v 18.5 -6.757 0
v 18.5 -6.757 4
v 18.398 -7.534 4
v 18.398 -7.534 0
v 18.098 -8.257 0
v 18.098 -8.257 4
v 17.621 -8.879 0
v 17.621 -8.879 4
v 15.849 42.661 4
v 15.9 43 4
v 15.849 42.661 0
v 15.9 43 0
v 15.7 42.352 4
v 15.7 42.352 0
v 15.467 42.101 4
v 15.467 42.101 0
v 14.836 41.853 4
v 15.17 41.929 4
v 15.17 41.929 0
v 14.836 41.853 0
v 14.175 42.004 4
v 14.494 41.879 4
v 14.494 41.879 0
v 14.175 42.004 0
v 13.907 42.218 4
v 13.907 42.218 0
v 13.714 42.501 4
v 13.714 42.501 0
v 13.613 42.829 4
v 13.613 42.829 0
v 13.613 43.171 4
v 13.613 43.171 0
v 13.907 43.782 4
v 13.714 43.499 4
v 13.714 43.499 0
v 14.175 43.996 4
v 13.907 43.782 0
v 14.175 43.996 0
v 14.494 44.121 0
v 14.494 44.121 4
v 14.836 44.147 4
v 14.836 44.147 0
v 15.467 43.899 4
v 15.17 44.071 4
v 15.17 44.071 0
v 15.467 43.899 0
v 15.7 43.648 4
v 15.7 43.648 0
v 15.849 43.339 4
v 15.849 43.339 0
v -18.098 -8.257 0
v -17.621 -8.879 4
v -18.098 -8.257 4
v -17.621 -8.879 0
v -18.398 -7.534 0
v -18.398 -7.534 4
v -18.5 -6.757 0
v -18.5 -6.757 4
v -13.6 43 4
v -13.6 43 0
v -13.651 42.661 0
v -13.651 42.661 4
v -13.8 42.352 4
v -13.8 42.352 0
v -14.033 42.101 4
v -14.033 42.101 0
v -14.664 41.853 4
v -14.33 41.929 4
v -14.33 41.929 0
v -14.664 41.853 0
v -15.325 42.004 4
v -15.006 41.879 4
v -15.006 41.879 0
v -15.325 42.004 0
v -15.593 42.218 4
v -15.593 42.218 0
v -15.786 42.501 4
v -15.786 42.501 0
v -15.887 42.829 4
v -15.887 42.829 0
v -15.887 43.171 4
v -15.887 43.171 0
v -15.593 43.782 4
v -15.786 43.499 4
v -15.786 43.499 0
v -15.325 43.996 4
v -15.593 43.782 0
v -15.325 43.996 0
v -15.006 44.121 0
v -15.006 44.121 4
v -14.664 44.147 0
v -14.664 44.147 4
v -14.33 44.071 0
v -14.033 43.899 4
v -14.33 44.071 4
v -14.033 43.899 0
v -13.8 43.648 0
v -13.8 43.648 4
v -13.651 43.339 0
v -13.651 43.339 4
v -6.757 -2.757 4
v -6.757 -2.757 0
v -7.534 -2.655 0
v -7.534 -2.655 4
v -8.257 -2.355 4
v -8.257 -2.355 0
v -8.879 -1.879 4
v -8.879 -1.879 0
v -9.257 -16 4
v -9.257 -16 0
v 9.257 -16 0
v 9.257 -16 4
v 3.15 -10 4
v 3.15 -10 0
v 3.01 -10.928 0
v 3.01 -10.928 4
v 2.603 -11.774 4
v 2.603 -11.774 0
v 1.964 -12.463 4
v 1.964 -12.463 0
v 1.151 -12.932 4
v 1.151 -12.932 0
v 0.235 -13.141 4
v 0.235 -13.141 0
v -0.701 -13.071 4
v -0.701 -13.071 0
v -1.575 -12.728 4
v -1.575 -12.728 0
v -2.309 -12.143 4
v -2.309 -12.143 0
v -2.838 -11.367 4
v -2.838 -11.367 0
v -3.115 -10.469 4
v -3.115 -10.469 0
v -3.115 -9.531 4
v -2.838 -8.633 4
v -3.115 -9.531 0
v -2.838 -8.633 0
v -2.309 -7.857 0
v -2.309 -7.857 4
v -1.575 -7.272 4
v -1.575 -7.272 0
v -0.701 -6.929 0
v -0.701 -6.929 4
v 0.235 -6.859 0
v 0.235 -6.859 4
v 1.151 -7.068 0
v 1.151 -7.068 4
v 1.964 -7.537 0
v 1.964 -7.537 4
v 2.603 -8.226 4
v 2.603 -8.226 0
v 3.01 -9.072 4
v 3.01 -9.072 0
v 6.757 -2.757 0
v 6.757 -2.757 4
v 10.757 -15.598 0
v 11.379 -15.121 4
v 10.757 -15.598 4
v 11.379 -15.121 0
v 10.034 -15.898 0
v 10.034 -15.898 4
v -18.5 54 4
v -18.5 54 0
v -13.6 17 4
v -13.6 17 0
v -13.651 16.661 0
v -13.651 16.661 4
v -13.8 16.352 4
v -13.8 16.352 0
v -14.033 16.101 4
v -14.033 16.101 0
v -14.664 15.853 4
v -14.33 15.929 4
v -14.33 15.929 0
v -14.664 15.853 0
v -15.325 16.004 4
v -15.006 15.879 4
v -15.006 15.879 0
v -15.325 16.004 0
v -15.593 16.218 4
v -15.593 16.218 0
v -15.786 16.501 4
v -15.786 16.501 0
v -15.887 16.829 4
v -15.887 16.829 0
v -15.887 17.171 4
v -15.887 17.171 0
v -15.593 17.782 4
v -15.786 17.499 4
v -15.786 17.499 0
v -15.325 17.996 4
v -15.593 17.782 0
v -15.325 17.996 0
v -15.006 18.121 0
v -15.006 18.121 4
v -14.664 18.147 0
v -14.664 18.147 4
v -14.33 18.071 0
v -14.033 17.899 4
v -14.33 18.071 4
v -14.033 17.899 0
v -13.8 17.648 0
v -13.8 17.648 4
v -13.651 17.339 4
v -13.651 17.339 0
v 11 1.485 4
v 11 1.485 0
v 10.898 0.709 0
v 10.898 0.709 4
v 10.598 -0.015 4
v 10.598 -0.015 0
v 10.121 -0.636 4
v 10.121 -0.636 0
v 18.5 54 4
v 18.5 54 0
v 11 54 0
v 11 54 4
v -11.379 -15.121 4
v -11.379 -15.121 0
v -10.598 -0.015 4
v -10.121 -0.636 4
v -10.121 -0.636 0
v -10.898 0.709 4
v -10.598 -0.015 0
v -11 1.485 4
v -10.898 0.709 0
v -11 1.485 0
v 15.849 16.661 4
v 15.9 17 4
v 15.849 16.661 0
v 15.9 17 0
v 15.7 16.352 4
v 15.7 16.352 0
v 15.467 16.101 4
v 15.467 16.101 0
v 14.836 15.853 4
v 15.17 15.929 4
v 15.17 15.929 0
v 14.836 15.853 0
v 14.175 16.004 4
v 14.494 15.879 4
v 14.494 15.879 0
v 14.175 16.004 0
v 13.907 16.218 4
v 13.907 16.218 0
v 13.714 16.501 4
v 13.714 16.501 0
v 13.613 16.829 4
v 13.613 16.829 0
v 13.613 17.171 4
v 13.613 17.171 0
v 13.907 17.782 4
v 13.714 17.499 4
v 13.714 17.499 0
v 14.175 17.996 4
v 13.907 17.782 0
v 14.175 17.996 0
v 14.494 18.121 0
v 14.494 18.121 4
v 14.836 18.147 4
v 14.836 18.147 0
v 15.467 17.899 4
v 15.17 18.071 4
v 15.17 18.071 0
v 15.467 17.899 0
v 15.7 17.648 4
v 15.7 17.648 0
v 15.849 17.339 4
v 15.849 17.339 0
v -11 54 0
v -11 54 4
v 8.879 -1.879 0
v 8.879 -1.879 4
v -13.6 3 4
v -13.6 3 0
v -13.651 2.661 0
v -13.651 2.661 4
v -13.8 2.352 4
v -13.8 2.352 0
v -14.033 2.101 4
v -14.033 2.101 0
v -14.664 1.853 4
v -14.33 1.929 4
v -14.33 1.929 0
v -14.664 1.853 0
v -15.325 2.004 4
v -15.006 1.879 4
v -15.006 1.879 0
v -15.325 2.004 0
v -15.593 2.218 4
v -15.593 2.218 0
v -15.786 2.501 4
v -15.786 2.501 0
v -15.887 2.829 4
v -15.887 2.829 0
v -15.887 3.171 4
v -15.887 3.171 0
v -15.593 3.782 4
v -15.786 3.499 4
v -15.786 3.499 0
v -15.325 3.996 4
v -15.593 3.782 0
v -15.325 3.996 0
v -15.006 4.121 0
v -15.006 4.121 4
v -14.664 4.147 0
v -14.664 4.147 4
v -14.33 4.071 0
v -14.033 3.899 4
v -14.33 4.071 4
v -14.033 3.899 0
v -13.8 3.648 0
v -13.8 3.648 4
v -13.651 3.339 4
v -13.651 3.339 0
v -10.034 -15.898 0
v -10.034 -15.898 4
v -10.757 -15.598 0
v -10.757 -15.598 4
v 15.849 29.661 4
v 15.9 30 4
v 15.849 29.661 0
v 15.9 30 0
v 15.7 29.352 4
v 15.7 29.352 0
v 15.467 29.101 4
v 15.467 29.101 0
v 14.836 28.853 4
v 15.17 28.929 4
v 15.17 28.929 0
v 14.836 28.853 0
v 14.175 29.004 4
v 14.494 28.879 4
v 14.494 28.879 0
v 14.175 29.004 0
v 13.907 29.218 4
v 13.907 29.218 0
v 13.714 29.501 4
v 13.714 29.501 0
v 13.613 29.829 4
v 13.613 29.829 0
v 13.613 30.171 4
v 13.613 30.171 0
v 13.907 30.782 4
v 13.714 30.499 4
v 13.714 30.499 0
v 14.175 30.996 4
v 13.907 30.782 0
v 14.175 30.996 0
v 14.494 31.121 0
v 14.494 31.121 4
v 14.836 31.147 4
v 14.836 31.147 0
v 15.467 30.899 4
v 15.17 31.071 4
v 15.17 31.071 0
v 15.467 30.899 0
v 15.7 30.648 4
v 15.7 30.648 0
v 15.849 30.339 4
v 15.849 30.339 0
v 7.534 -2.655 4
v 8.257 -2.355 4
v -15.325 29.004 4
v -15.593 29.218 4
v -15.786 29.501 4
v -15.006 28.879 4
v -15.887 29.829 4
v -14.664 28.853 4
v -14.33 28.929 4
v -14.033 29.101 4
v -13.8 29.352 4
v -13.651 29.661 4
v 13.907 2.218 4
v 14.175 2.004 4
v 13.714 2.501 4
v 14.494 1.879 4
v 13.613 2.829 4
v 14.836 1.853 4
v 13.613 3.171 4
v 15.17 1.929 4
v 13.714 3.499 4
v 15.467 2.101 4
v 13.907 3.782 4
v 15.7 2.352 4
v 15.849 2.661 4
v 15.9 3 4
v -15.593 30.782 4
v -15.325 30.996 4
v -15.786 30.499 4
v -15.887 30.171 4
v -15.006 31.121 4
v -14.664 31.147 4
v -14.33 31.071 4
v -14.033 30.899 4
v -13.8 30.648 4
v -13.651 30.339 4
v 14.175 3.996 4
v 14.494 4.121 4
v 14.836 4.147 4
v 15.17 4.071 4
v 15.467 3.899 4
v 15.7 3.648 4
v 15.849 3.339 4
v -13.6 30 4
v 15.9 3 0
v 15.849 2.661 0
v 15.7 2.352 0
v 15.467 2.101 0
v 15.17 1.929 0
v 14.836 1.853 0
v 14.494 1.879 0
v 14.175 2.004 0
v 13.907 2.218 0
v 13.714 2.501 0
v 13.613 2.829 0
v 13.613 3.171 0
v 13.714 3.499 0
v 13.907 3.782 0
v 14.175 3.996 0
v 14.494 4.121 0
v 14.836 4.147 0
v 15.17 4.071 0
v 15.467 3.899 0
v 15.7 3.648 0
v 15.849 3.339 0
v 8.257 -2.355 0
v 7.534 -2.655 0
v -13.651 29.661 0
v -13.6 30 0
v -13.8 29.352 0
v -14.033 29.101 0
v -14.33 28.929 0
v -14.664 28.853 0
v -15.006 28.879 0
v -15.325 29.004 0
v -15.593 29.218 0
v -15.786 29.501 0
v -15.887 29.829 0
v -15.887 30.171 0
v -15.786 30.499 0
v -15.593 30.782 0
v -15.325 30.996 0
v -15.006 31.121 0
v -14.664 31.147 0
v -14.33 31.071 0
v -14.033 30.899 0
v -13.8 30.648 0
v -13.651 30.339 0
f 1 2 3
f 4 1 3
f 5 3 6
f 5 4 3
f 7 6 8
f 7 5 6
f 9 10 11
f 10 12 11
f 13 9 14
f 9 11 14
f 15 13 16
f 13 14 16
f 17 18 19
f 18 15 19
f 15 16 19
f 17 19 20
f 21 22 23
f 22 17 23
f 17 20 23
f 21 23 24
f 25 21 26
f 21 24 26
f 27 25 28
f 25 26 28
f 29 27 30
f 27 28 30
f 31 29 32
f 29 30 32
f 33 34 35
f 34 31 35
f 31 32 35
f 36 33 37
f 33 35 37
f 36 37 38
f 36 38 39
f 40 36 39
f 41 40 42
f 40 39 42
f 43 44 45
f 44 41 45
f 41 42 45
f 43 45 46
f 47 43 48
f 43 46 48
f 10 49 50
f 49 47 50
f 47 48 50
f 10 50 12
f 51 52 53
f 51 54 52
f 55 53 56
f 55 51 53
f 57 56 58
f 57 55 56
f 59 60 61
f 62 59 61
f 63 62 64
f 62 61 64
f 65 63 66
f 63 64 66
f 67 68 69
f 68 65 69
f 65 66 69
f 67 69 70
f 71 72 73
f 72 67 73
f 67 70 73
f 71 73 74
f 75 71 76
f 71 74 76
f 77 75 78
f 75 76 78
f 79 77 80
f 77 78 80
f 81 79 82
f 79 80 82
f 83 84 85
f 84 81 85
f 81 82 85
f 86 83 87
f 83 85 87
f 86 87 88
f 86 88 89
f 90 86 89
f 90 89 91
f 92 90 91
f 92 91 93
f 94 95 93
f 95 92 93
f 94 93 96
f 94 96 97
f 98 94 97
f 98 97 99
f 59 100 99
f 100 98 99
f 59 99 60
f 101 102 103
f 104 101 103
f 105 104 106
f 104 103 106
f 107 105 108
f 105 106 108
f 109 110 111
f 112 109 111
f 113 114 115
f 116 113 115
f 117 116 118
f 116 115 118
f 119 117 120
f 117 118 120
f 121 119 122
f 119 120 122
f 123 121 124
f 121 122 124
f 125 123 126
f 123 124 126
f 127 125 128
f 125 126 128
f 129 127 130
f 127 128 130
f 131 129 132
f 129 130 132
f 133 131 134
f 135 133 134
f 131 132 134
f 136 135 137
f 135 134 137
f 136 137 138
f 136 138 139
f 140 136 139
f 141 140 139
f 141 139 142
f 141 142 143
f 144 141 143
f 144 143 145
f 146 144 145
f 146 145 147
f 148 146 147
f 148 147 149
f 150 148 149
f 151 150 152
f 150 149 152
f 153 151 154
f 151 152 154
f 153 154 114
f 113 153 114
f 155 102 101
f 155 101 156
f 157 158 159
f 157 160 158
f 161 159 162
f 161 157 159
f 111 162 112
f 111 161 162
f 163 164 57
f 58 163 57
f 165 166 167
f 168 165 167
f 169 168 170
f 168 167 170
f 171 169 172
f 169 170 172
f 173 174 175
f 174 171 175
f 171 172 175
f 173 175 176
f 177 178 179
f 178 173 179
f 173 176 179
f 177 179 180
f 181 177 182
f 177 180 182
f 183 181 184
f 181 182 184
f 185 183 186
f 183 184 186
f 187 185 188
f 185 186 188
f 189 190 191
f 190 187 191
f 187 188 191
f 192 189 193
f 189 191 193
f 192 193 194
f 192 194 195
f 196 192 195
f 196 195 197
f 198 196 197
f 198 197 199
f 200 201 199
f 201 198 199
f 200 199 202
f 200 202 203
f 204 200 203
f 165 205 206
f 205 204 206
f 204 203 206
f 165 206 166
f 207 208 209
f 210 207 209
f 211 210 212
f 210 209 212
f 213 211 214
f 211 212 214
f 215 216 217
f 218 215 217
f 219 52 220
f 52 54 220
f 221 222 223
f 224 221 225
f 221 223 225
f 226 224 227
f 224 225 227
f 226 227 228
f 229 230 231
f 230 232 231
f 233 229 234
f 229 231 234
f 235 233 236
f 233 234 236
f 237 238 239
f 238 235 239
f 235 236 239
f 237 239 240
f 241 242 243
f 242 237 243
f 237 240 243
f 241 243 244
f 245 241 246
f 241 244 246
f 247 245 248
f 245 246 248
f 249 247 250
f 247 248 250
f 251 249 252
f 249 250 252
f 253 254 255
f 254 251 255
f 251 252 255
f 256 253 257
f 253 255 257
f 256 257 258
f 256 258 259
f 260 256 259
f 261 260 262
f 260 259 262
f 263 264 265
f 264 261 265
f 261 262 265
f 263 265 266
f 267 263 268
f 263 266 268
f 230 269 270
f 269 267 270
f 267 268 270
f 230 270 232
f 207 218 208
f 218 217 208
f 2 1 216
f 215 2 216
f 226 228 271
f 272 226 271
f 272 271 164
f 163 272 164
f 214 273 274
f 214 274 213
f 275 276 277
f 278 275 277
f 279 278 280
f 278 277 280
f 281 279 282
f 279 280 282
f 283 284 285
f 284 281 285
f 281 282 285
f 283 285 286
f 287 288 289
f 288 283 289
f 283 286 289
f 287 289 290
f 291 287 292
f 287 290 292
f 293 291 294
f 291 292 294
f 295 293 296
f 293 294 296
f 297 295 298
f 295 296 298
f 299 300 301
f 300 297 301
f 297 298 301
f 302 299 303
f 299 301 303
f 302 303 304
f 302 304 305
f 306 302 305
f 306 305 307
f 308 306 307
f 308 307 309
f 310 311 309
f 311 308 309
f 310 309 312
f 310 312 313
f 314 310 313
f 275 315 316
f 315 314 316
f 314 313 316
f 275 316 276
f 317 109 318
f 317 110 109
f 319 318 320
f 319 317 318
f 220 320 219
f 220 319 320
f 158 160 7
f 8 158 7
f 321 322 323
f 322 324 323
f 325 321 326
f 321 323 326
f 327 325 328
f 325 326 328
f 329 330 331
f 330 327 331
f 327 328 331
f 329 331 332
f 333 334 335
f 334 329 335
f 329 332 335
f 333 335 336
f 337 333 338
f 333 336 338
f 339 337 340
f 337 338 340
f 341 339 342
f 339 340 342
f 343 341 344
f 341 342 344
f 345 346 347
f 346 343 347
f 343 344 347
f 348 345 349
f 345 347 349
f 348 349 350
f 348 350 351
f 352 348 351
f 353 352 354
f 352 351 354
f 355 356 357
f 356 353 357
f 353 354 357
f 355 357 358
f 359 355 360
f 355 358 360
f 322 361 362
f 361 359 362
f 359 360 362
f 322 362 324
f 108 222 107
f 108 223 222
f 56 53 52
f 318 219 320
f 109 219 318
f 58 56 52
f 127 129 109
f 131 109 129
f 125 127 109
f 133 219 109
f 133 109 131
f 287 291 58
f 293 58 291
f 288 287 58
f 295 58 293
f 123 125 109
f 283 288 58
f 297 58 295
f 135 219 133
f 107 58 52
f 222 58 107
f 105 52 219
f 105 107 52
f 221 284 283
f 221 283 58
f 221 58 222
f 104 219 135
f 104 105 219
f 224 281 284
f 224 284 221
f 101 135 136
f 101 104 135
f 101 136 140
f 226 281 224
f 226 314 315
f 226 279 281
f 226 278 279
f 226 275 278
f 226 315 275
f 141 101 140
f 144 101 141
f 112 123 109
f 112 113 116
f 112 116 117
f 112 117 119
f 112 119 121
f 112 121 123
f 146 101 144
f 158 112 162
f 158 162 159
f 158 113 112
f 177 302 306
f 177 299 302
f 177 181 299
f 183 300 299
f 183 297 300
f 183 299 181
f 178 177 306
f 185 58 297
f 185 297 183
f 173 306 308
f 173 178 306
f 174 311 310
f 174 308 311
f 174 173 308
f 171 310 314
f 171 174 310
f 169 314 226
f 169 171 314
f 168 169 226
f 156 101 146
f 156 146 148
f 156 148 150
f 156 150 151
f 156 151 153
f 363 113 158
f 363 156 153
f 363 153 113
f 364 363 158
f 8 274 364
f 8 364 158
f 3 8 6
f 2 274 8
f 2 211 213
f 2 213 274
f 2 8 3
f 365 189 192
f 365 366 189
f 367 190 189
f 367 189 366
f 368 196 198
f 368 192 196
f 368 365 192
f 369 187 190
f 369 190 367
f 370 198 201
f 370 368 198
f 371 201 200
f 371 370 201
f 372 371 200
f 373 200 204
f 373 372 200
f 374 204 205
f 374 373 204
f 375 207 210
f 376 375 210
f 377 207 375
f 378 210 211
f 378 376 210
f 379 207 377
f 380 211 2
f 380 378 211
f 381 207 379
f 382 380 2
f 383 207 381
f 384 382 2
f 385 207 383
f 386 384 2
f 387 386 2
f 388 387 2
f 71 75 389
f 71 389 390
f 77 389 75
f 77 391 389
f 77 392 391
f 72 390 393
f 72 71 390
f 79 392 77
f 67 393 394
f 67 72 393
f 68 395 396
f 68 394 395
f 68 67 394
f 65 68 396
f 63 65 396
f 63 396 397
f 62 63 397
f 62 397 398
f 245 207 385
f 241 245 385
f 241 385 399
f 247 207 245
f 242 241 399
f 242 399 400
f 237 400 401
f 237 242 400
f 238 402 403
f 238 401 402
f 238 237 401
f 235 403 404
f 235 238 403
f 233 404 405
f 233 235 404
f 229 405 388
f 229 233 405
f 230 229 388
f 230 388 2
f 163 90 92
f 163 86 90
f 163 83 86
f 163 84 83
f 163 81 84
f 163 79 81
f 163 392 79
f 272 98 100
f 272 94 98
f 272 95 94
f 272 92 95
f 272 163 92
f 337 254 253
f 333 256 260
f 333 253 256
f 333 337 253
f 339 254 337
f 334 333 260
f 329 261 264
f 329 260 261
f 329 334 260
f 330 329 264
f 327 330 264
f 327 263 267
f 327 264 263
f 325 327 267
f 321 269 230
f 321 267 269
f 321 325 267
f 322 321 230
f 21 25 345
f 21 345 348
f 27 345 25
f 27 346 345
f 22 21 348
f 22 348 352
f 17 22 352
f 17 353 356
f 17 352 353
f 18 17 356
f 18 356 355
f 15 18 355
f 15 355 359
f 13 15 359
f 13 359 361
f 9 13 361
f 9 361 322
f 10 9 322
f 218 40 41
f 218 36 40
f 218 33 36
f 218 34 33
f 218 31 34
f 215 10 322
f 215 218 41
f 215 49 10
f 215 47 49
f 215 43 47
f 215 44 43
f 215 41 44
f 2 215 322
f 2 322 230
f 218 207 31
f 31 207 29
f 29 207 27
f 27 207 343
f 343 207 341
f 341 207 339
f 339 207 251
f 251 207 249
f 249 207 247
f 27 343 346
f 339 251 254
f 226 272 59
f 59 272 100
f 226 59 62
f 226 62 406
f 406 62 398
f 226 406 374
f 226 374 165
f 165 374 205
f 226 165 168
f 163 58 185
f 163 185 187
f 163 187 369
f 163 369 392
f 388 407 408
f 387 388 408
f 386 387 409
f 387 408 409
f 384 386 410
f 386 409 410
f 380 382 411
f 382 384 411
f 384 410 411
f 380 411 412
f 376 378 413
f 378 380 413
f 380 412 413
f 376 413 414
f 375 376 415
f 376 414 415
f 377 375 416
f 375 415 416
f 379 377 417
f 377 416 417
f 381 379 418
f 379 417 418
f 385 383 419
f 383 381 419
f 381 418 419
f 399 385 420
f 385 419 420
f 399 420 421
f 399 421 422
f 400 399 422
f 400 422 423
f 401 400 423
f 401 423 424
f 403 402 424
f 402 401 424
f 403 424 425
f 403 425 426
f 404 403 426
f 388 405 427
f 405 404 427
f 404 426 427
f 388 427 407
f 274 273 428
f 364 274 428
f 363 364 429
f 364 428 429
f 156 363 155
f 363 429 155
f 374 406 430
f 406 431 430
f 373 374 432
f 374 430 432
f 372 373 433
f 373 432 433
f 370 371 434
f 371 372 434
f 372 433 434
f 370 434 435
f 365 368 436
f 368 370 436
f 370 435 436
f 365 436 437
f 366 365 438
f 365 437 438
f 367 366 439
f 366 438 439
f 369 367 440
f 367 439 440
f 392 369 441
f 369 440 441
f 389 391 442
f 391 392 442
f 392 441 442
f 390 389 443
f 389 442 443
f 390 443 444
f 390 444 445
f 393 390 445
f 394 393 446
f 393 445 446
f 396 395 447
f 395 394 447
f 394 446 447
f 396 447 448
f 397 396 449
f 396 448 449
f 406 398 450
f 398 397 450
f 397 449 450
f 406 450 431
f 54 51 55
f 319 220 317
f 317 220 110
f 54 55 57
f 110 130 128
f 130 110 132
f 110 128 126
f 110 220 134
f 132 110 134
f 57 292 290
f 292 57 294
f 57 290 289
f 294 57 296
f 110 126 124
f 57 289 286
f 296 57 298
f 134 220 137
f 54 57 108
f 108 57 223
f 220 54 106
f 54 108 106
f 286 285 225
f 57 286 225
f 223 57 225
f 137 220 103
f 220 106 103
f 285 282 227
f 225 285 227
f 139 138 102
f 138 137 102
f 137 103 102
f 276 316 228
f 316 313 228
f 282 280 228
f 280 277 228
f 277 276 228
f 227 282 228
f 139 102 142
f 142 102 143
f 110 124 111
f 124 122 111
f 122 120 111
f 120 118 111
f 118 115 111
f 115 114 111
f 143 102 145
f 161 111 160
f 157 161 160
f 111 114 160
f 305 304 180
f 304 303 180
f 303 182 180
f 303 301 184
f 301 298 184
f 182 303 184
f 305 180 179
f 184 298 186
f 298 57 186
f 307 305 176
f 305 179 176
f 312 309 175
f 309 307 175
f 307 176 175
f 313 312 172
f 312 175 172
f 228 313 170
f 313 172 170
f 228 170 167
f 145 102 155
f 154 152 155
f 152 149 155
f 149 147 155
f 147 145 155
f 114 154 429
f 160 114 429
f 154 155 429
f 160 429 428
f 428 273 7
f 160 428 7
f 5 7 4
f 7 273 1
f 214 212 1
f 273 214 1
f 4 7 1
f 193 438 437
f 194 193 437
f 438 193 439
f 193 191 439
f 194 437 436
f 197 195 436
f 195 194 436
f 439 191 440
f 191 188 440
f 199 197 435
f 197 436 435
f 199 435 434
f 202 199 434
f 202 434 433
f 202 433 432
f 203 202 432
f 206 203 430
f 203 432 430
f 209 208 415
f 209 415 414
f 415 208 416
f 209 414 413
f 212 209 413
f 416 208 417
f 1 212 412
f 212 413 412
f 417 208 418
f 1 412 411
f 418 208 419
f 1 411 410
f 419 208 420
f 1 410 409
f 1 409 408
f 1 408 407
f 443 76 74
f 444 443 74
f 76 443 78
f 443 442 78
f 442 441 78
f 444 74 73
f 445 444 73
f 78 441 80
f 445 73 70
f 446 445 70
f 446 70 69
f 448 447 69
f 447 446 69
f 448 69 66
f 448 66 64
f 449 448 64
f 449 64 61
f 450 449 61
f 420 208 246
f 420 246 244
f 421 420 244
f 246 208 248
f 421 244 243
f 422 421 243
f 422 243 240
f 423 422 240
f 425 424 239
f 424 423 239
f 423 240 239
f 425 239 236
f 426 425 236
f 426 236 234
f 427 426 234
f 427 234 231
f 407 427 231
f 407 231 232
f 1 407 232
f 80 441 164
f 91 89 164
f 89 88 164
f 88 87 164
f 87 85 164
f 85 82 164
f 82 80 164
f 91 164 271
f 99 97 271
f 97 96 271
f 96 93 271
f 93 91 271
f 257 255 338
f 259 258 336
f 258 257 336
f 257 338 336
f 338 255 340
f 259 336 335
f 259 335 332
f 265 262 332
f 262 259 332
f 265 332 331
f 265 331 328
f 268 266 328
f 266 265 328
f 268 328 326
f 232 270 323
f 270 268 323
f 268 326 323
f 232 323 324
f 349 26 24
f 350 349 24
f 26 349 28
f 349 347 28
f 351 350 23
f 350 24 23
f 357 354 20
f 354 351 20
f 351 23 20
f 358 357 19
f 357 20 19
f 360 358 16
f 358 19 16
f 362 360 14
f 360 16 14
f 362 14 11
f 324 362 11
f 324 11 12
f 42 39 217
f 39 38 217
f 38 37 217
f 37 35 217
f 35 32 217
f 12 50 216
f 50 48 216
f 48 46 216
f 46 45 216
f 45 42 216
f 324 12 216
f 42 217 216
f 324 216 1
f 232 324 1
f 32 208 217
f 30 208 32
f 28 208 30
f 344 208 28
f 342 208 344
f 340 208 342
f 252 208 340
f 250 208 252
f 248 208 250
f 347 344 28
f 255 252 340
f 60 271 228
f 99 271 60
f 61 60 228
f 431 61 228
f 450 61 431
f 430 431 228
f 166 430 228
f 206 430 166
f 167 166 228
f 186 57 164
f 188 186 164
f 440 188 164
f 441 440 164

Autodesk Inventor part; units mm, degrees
ref_plane "YZ Plane" through (0, 0, 0) normal (1, 0, 0) x (0, 1, 0)
ref_plane "XZ Plane" through (0, 0, 0) normal (0, 1, 0) x (-1, 0, 0)
ref_plane "XY Plane" through (0, 0, 0) normal (0, 0, 1) x (1, 0, 0)
sketch "Skizze2" plane through (0, 0, 0) normal (0, 0, 1) x (1, 0, 0)
  line L0 (-26.1954, 0) -> (26.1954, 0) projected
  line L1 (0, -30.2532) -> (0, 68.0422) projected
  line L2 (-18.5, 54) -> (-18.5, -6.7574)
  line L3 (-9.2574, -16) -> (9.2574, -16)
  line L4 (18.5, -6.7574) -> (18.5, 54)
  line L5 (18.5, 54) -> (11, 54)
  line L6 (11, 54) -> (11, 4.2426)
  line L7 (-11, 4.2426) -> (-11, 54)
  line L8 (-11, 54) -> (-18.5, 54)
  circle A0 centre (0, -10) radius 3.15
  circle A1 centre (-14.75, 43) radius 1.15
  circle A2 centre (-14.75, 30) radius 1.15
  circle A3 centre (-14.75, 17) radius 1.15
  circle A4 centre (-14.75, 3) radius 1.15
  circle A5 centre (14.75, 43) radius 1.15
  circle A6 centre (14.75, 30) radius 1.15
  circle A7 centre (14.75, 17) radius 1.15
  circle A8 centre (14.75, 3) radius 1.15
  line L9 (-17.6213, -8.8787) -> (-11.3787, -15.1213)
  line L10 (11.3787, -15.1213) -> (17.6213, -8.8787)
  arc A9 (-18.5, -6.7574) -> (-17.6213, -8.8787) centre (-15.5, -6.7574) ccw
  arc A10 (-11.3787, -15.1213) -> (-9.2574, -16) centre (-9.2574, -13) ccw
  arc A11 (9.2574, -16) -> (11.3787, -15.1213) centre (9.2574, -13) ccw
  line L11 (-11, 4.2426) -> (-11, 1.4853)
  line L12 (11, 4.2426) -> (11, 1.4853)
  line L13 (-6.7574, -2.7574) -> (6.7574, -2.7574)
  line L14 (-10.1213, -0.636) -> (-8.8787, -1.8787)
  line L15 (8.8787, -1.8787) -> (10.1213, -0.636)
  arc A12 (-11, 1.4853) -> (-10.1213, -0.636) centre (-8, 1.4853) ccw
  arc A13 (-8.8787, -1.8787) -> (-6.7574, -2.7574) centre (-6.7574, 0.2426) ccw
  arc A14 (6.7574, -2.7574) -> (8.8787, -1.8787) centre (6.7574, 0.2426) ccw
  arc A15 (10.1213, -0.636) -> (11, 1.4853) centre (8, 1.4853) ccw
  arc A16 (17.6213, -8.8787) -> (18.5, -6.7574) centre (15.5, -6.7574) ccw
  point P0 (0, 0)
  point P1 (-18.5, -16)
  point P2 (18.5, -16)
  point P3 (11, 0)
  point P4 (-11, 0)
  point P5 (-8, 0)
  point P6 (-11, 3)
  point P7 (8, 0)
  point P8 (11, 3)
  point P9 (-18.5, -8)
  point P10 (-10.5, -16)
  point P11 (10.5, -16)
  point P12 (18.5, -8)
  point P13 (-11, -2.7574)
  point P14 (11, -2.7574)
  point P15 (-11, 0.2426)
  point P16 (-8, -2.7574)
  point P17 (8, -2.7574)
  point P18 (11, 0.2426)
  dimension "d0" = 70
  dimension "d1" = 37
  dimension "d2" = 90
  dimension "d3" = 70
  dimension "d4" = 90
  dimension "d6" = 7.5
  dimension "d8" = 90
  dimension "d9" = 22
  dimension "d10" = 54
  dimension "d11" = 6.3
  dimension "d13" = 6
  dimension "d14" = 2.3
  dimension "d15" = 3.75
  dimension "d16" = 11
  dimension "d17" = 2.3
  dimension "d18" = 2.3
  dimension "d19" = 2.3
  dimension "d20" = 13
  dimension "d21" = 13
  dimension "d22" = 14
  dimension "d23" = 3.75
  dimension "d24" = 3.75
  dimension "d25" = 3.75
  dimension "d26" = 2.3
  dimension "d27" = 2.3
  dimension "d28" = 2.3
  dimension "d29" = 2.3
  dimension "d30" = 3.75
  dimension "d31" = 3
  dimension "d32" = 3
  dimension "d33" = 3
  dimension "d34" = 3
  dimension "d35" = 8
  dimension "d36" = 8
  dimension "d37" = 8
  dimension "d38" = 8
  dimension "d45" = 7
  dimension "d46" = 7
  dimension "d47" = 3
  dimension "d48" = 3
  dimension "d49" = 3
  dimension "d50" = 3
  dimension "d51" = 3
  dimension "d52" = 90
  dimension "d53" = 54
  dimension "d54" = 2.7574
  dimension "d55" = 11
  dimension "d56" = 8
  dimension "d57" = 8
  dimension "d58" = 3
extrude "Extrusion1" add sketch "Skizze2" along normal blind 4 contours L2 L8 L7 L11 A12 L0 | L0 A12 L14 A13 L13 L1 A0 L3 A10 L9 A9 L2 | A15 L12 L6 L5 L4 L0 | L0 L4 A16 L10 A11 L3 L1 A0 L13 A14 L15 A15
equation "\"d3\" = d0"
equation "\"d14\" = d29"
equation "\"d17\" = d28"
equation "\"d18\" = d28"
equation "\"d19\" = d29"
equation "\"d23\" = d24"
equation "\"d24\" = d25"
equation "\"d25\" = d15"
equation "\"d26\" = d29"
equation "\"d27\" = d28"
equation "\"d28\" = d29"
equation "\"d30\" = d15"
equation "\"d32\" = d31"
equation "\"d33\" = d31"
equation "\"d34\" = d33"
equation "\"d36\" = d35"
equation "\"d37\" = d35"
equation "\"d38\" = d37"
equation "\"d46\" = d45"
equation "\"d48\" = d47"
equation "\"d49\" = d47"
equation "\"d50\" = d49"
properties part number "Part1_new1" material "Aluminium 6061"
